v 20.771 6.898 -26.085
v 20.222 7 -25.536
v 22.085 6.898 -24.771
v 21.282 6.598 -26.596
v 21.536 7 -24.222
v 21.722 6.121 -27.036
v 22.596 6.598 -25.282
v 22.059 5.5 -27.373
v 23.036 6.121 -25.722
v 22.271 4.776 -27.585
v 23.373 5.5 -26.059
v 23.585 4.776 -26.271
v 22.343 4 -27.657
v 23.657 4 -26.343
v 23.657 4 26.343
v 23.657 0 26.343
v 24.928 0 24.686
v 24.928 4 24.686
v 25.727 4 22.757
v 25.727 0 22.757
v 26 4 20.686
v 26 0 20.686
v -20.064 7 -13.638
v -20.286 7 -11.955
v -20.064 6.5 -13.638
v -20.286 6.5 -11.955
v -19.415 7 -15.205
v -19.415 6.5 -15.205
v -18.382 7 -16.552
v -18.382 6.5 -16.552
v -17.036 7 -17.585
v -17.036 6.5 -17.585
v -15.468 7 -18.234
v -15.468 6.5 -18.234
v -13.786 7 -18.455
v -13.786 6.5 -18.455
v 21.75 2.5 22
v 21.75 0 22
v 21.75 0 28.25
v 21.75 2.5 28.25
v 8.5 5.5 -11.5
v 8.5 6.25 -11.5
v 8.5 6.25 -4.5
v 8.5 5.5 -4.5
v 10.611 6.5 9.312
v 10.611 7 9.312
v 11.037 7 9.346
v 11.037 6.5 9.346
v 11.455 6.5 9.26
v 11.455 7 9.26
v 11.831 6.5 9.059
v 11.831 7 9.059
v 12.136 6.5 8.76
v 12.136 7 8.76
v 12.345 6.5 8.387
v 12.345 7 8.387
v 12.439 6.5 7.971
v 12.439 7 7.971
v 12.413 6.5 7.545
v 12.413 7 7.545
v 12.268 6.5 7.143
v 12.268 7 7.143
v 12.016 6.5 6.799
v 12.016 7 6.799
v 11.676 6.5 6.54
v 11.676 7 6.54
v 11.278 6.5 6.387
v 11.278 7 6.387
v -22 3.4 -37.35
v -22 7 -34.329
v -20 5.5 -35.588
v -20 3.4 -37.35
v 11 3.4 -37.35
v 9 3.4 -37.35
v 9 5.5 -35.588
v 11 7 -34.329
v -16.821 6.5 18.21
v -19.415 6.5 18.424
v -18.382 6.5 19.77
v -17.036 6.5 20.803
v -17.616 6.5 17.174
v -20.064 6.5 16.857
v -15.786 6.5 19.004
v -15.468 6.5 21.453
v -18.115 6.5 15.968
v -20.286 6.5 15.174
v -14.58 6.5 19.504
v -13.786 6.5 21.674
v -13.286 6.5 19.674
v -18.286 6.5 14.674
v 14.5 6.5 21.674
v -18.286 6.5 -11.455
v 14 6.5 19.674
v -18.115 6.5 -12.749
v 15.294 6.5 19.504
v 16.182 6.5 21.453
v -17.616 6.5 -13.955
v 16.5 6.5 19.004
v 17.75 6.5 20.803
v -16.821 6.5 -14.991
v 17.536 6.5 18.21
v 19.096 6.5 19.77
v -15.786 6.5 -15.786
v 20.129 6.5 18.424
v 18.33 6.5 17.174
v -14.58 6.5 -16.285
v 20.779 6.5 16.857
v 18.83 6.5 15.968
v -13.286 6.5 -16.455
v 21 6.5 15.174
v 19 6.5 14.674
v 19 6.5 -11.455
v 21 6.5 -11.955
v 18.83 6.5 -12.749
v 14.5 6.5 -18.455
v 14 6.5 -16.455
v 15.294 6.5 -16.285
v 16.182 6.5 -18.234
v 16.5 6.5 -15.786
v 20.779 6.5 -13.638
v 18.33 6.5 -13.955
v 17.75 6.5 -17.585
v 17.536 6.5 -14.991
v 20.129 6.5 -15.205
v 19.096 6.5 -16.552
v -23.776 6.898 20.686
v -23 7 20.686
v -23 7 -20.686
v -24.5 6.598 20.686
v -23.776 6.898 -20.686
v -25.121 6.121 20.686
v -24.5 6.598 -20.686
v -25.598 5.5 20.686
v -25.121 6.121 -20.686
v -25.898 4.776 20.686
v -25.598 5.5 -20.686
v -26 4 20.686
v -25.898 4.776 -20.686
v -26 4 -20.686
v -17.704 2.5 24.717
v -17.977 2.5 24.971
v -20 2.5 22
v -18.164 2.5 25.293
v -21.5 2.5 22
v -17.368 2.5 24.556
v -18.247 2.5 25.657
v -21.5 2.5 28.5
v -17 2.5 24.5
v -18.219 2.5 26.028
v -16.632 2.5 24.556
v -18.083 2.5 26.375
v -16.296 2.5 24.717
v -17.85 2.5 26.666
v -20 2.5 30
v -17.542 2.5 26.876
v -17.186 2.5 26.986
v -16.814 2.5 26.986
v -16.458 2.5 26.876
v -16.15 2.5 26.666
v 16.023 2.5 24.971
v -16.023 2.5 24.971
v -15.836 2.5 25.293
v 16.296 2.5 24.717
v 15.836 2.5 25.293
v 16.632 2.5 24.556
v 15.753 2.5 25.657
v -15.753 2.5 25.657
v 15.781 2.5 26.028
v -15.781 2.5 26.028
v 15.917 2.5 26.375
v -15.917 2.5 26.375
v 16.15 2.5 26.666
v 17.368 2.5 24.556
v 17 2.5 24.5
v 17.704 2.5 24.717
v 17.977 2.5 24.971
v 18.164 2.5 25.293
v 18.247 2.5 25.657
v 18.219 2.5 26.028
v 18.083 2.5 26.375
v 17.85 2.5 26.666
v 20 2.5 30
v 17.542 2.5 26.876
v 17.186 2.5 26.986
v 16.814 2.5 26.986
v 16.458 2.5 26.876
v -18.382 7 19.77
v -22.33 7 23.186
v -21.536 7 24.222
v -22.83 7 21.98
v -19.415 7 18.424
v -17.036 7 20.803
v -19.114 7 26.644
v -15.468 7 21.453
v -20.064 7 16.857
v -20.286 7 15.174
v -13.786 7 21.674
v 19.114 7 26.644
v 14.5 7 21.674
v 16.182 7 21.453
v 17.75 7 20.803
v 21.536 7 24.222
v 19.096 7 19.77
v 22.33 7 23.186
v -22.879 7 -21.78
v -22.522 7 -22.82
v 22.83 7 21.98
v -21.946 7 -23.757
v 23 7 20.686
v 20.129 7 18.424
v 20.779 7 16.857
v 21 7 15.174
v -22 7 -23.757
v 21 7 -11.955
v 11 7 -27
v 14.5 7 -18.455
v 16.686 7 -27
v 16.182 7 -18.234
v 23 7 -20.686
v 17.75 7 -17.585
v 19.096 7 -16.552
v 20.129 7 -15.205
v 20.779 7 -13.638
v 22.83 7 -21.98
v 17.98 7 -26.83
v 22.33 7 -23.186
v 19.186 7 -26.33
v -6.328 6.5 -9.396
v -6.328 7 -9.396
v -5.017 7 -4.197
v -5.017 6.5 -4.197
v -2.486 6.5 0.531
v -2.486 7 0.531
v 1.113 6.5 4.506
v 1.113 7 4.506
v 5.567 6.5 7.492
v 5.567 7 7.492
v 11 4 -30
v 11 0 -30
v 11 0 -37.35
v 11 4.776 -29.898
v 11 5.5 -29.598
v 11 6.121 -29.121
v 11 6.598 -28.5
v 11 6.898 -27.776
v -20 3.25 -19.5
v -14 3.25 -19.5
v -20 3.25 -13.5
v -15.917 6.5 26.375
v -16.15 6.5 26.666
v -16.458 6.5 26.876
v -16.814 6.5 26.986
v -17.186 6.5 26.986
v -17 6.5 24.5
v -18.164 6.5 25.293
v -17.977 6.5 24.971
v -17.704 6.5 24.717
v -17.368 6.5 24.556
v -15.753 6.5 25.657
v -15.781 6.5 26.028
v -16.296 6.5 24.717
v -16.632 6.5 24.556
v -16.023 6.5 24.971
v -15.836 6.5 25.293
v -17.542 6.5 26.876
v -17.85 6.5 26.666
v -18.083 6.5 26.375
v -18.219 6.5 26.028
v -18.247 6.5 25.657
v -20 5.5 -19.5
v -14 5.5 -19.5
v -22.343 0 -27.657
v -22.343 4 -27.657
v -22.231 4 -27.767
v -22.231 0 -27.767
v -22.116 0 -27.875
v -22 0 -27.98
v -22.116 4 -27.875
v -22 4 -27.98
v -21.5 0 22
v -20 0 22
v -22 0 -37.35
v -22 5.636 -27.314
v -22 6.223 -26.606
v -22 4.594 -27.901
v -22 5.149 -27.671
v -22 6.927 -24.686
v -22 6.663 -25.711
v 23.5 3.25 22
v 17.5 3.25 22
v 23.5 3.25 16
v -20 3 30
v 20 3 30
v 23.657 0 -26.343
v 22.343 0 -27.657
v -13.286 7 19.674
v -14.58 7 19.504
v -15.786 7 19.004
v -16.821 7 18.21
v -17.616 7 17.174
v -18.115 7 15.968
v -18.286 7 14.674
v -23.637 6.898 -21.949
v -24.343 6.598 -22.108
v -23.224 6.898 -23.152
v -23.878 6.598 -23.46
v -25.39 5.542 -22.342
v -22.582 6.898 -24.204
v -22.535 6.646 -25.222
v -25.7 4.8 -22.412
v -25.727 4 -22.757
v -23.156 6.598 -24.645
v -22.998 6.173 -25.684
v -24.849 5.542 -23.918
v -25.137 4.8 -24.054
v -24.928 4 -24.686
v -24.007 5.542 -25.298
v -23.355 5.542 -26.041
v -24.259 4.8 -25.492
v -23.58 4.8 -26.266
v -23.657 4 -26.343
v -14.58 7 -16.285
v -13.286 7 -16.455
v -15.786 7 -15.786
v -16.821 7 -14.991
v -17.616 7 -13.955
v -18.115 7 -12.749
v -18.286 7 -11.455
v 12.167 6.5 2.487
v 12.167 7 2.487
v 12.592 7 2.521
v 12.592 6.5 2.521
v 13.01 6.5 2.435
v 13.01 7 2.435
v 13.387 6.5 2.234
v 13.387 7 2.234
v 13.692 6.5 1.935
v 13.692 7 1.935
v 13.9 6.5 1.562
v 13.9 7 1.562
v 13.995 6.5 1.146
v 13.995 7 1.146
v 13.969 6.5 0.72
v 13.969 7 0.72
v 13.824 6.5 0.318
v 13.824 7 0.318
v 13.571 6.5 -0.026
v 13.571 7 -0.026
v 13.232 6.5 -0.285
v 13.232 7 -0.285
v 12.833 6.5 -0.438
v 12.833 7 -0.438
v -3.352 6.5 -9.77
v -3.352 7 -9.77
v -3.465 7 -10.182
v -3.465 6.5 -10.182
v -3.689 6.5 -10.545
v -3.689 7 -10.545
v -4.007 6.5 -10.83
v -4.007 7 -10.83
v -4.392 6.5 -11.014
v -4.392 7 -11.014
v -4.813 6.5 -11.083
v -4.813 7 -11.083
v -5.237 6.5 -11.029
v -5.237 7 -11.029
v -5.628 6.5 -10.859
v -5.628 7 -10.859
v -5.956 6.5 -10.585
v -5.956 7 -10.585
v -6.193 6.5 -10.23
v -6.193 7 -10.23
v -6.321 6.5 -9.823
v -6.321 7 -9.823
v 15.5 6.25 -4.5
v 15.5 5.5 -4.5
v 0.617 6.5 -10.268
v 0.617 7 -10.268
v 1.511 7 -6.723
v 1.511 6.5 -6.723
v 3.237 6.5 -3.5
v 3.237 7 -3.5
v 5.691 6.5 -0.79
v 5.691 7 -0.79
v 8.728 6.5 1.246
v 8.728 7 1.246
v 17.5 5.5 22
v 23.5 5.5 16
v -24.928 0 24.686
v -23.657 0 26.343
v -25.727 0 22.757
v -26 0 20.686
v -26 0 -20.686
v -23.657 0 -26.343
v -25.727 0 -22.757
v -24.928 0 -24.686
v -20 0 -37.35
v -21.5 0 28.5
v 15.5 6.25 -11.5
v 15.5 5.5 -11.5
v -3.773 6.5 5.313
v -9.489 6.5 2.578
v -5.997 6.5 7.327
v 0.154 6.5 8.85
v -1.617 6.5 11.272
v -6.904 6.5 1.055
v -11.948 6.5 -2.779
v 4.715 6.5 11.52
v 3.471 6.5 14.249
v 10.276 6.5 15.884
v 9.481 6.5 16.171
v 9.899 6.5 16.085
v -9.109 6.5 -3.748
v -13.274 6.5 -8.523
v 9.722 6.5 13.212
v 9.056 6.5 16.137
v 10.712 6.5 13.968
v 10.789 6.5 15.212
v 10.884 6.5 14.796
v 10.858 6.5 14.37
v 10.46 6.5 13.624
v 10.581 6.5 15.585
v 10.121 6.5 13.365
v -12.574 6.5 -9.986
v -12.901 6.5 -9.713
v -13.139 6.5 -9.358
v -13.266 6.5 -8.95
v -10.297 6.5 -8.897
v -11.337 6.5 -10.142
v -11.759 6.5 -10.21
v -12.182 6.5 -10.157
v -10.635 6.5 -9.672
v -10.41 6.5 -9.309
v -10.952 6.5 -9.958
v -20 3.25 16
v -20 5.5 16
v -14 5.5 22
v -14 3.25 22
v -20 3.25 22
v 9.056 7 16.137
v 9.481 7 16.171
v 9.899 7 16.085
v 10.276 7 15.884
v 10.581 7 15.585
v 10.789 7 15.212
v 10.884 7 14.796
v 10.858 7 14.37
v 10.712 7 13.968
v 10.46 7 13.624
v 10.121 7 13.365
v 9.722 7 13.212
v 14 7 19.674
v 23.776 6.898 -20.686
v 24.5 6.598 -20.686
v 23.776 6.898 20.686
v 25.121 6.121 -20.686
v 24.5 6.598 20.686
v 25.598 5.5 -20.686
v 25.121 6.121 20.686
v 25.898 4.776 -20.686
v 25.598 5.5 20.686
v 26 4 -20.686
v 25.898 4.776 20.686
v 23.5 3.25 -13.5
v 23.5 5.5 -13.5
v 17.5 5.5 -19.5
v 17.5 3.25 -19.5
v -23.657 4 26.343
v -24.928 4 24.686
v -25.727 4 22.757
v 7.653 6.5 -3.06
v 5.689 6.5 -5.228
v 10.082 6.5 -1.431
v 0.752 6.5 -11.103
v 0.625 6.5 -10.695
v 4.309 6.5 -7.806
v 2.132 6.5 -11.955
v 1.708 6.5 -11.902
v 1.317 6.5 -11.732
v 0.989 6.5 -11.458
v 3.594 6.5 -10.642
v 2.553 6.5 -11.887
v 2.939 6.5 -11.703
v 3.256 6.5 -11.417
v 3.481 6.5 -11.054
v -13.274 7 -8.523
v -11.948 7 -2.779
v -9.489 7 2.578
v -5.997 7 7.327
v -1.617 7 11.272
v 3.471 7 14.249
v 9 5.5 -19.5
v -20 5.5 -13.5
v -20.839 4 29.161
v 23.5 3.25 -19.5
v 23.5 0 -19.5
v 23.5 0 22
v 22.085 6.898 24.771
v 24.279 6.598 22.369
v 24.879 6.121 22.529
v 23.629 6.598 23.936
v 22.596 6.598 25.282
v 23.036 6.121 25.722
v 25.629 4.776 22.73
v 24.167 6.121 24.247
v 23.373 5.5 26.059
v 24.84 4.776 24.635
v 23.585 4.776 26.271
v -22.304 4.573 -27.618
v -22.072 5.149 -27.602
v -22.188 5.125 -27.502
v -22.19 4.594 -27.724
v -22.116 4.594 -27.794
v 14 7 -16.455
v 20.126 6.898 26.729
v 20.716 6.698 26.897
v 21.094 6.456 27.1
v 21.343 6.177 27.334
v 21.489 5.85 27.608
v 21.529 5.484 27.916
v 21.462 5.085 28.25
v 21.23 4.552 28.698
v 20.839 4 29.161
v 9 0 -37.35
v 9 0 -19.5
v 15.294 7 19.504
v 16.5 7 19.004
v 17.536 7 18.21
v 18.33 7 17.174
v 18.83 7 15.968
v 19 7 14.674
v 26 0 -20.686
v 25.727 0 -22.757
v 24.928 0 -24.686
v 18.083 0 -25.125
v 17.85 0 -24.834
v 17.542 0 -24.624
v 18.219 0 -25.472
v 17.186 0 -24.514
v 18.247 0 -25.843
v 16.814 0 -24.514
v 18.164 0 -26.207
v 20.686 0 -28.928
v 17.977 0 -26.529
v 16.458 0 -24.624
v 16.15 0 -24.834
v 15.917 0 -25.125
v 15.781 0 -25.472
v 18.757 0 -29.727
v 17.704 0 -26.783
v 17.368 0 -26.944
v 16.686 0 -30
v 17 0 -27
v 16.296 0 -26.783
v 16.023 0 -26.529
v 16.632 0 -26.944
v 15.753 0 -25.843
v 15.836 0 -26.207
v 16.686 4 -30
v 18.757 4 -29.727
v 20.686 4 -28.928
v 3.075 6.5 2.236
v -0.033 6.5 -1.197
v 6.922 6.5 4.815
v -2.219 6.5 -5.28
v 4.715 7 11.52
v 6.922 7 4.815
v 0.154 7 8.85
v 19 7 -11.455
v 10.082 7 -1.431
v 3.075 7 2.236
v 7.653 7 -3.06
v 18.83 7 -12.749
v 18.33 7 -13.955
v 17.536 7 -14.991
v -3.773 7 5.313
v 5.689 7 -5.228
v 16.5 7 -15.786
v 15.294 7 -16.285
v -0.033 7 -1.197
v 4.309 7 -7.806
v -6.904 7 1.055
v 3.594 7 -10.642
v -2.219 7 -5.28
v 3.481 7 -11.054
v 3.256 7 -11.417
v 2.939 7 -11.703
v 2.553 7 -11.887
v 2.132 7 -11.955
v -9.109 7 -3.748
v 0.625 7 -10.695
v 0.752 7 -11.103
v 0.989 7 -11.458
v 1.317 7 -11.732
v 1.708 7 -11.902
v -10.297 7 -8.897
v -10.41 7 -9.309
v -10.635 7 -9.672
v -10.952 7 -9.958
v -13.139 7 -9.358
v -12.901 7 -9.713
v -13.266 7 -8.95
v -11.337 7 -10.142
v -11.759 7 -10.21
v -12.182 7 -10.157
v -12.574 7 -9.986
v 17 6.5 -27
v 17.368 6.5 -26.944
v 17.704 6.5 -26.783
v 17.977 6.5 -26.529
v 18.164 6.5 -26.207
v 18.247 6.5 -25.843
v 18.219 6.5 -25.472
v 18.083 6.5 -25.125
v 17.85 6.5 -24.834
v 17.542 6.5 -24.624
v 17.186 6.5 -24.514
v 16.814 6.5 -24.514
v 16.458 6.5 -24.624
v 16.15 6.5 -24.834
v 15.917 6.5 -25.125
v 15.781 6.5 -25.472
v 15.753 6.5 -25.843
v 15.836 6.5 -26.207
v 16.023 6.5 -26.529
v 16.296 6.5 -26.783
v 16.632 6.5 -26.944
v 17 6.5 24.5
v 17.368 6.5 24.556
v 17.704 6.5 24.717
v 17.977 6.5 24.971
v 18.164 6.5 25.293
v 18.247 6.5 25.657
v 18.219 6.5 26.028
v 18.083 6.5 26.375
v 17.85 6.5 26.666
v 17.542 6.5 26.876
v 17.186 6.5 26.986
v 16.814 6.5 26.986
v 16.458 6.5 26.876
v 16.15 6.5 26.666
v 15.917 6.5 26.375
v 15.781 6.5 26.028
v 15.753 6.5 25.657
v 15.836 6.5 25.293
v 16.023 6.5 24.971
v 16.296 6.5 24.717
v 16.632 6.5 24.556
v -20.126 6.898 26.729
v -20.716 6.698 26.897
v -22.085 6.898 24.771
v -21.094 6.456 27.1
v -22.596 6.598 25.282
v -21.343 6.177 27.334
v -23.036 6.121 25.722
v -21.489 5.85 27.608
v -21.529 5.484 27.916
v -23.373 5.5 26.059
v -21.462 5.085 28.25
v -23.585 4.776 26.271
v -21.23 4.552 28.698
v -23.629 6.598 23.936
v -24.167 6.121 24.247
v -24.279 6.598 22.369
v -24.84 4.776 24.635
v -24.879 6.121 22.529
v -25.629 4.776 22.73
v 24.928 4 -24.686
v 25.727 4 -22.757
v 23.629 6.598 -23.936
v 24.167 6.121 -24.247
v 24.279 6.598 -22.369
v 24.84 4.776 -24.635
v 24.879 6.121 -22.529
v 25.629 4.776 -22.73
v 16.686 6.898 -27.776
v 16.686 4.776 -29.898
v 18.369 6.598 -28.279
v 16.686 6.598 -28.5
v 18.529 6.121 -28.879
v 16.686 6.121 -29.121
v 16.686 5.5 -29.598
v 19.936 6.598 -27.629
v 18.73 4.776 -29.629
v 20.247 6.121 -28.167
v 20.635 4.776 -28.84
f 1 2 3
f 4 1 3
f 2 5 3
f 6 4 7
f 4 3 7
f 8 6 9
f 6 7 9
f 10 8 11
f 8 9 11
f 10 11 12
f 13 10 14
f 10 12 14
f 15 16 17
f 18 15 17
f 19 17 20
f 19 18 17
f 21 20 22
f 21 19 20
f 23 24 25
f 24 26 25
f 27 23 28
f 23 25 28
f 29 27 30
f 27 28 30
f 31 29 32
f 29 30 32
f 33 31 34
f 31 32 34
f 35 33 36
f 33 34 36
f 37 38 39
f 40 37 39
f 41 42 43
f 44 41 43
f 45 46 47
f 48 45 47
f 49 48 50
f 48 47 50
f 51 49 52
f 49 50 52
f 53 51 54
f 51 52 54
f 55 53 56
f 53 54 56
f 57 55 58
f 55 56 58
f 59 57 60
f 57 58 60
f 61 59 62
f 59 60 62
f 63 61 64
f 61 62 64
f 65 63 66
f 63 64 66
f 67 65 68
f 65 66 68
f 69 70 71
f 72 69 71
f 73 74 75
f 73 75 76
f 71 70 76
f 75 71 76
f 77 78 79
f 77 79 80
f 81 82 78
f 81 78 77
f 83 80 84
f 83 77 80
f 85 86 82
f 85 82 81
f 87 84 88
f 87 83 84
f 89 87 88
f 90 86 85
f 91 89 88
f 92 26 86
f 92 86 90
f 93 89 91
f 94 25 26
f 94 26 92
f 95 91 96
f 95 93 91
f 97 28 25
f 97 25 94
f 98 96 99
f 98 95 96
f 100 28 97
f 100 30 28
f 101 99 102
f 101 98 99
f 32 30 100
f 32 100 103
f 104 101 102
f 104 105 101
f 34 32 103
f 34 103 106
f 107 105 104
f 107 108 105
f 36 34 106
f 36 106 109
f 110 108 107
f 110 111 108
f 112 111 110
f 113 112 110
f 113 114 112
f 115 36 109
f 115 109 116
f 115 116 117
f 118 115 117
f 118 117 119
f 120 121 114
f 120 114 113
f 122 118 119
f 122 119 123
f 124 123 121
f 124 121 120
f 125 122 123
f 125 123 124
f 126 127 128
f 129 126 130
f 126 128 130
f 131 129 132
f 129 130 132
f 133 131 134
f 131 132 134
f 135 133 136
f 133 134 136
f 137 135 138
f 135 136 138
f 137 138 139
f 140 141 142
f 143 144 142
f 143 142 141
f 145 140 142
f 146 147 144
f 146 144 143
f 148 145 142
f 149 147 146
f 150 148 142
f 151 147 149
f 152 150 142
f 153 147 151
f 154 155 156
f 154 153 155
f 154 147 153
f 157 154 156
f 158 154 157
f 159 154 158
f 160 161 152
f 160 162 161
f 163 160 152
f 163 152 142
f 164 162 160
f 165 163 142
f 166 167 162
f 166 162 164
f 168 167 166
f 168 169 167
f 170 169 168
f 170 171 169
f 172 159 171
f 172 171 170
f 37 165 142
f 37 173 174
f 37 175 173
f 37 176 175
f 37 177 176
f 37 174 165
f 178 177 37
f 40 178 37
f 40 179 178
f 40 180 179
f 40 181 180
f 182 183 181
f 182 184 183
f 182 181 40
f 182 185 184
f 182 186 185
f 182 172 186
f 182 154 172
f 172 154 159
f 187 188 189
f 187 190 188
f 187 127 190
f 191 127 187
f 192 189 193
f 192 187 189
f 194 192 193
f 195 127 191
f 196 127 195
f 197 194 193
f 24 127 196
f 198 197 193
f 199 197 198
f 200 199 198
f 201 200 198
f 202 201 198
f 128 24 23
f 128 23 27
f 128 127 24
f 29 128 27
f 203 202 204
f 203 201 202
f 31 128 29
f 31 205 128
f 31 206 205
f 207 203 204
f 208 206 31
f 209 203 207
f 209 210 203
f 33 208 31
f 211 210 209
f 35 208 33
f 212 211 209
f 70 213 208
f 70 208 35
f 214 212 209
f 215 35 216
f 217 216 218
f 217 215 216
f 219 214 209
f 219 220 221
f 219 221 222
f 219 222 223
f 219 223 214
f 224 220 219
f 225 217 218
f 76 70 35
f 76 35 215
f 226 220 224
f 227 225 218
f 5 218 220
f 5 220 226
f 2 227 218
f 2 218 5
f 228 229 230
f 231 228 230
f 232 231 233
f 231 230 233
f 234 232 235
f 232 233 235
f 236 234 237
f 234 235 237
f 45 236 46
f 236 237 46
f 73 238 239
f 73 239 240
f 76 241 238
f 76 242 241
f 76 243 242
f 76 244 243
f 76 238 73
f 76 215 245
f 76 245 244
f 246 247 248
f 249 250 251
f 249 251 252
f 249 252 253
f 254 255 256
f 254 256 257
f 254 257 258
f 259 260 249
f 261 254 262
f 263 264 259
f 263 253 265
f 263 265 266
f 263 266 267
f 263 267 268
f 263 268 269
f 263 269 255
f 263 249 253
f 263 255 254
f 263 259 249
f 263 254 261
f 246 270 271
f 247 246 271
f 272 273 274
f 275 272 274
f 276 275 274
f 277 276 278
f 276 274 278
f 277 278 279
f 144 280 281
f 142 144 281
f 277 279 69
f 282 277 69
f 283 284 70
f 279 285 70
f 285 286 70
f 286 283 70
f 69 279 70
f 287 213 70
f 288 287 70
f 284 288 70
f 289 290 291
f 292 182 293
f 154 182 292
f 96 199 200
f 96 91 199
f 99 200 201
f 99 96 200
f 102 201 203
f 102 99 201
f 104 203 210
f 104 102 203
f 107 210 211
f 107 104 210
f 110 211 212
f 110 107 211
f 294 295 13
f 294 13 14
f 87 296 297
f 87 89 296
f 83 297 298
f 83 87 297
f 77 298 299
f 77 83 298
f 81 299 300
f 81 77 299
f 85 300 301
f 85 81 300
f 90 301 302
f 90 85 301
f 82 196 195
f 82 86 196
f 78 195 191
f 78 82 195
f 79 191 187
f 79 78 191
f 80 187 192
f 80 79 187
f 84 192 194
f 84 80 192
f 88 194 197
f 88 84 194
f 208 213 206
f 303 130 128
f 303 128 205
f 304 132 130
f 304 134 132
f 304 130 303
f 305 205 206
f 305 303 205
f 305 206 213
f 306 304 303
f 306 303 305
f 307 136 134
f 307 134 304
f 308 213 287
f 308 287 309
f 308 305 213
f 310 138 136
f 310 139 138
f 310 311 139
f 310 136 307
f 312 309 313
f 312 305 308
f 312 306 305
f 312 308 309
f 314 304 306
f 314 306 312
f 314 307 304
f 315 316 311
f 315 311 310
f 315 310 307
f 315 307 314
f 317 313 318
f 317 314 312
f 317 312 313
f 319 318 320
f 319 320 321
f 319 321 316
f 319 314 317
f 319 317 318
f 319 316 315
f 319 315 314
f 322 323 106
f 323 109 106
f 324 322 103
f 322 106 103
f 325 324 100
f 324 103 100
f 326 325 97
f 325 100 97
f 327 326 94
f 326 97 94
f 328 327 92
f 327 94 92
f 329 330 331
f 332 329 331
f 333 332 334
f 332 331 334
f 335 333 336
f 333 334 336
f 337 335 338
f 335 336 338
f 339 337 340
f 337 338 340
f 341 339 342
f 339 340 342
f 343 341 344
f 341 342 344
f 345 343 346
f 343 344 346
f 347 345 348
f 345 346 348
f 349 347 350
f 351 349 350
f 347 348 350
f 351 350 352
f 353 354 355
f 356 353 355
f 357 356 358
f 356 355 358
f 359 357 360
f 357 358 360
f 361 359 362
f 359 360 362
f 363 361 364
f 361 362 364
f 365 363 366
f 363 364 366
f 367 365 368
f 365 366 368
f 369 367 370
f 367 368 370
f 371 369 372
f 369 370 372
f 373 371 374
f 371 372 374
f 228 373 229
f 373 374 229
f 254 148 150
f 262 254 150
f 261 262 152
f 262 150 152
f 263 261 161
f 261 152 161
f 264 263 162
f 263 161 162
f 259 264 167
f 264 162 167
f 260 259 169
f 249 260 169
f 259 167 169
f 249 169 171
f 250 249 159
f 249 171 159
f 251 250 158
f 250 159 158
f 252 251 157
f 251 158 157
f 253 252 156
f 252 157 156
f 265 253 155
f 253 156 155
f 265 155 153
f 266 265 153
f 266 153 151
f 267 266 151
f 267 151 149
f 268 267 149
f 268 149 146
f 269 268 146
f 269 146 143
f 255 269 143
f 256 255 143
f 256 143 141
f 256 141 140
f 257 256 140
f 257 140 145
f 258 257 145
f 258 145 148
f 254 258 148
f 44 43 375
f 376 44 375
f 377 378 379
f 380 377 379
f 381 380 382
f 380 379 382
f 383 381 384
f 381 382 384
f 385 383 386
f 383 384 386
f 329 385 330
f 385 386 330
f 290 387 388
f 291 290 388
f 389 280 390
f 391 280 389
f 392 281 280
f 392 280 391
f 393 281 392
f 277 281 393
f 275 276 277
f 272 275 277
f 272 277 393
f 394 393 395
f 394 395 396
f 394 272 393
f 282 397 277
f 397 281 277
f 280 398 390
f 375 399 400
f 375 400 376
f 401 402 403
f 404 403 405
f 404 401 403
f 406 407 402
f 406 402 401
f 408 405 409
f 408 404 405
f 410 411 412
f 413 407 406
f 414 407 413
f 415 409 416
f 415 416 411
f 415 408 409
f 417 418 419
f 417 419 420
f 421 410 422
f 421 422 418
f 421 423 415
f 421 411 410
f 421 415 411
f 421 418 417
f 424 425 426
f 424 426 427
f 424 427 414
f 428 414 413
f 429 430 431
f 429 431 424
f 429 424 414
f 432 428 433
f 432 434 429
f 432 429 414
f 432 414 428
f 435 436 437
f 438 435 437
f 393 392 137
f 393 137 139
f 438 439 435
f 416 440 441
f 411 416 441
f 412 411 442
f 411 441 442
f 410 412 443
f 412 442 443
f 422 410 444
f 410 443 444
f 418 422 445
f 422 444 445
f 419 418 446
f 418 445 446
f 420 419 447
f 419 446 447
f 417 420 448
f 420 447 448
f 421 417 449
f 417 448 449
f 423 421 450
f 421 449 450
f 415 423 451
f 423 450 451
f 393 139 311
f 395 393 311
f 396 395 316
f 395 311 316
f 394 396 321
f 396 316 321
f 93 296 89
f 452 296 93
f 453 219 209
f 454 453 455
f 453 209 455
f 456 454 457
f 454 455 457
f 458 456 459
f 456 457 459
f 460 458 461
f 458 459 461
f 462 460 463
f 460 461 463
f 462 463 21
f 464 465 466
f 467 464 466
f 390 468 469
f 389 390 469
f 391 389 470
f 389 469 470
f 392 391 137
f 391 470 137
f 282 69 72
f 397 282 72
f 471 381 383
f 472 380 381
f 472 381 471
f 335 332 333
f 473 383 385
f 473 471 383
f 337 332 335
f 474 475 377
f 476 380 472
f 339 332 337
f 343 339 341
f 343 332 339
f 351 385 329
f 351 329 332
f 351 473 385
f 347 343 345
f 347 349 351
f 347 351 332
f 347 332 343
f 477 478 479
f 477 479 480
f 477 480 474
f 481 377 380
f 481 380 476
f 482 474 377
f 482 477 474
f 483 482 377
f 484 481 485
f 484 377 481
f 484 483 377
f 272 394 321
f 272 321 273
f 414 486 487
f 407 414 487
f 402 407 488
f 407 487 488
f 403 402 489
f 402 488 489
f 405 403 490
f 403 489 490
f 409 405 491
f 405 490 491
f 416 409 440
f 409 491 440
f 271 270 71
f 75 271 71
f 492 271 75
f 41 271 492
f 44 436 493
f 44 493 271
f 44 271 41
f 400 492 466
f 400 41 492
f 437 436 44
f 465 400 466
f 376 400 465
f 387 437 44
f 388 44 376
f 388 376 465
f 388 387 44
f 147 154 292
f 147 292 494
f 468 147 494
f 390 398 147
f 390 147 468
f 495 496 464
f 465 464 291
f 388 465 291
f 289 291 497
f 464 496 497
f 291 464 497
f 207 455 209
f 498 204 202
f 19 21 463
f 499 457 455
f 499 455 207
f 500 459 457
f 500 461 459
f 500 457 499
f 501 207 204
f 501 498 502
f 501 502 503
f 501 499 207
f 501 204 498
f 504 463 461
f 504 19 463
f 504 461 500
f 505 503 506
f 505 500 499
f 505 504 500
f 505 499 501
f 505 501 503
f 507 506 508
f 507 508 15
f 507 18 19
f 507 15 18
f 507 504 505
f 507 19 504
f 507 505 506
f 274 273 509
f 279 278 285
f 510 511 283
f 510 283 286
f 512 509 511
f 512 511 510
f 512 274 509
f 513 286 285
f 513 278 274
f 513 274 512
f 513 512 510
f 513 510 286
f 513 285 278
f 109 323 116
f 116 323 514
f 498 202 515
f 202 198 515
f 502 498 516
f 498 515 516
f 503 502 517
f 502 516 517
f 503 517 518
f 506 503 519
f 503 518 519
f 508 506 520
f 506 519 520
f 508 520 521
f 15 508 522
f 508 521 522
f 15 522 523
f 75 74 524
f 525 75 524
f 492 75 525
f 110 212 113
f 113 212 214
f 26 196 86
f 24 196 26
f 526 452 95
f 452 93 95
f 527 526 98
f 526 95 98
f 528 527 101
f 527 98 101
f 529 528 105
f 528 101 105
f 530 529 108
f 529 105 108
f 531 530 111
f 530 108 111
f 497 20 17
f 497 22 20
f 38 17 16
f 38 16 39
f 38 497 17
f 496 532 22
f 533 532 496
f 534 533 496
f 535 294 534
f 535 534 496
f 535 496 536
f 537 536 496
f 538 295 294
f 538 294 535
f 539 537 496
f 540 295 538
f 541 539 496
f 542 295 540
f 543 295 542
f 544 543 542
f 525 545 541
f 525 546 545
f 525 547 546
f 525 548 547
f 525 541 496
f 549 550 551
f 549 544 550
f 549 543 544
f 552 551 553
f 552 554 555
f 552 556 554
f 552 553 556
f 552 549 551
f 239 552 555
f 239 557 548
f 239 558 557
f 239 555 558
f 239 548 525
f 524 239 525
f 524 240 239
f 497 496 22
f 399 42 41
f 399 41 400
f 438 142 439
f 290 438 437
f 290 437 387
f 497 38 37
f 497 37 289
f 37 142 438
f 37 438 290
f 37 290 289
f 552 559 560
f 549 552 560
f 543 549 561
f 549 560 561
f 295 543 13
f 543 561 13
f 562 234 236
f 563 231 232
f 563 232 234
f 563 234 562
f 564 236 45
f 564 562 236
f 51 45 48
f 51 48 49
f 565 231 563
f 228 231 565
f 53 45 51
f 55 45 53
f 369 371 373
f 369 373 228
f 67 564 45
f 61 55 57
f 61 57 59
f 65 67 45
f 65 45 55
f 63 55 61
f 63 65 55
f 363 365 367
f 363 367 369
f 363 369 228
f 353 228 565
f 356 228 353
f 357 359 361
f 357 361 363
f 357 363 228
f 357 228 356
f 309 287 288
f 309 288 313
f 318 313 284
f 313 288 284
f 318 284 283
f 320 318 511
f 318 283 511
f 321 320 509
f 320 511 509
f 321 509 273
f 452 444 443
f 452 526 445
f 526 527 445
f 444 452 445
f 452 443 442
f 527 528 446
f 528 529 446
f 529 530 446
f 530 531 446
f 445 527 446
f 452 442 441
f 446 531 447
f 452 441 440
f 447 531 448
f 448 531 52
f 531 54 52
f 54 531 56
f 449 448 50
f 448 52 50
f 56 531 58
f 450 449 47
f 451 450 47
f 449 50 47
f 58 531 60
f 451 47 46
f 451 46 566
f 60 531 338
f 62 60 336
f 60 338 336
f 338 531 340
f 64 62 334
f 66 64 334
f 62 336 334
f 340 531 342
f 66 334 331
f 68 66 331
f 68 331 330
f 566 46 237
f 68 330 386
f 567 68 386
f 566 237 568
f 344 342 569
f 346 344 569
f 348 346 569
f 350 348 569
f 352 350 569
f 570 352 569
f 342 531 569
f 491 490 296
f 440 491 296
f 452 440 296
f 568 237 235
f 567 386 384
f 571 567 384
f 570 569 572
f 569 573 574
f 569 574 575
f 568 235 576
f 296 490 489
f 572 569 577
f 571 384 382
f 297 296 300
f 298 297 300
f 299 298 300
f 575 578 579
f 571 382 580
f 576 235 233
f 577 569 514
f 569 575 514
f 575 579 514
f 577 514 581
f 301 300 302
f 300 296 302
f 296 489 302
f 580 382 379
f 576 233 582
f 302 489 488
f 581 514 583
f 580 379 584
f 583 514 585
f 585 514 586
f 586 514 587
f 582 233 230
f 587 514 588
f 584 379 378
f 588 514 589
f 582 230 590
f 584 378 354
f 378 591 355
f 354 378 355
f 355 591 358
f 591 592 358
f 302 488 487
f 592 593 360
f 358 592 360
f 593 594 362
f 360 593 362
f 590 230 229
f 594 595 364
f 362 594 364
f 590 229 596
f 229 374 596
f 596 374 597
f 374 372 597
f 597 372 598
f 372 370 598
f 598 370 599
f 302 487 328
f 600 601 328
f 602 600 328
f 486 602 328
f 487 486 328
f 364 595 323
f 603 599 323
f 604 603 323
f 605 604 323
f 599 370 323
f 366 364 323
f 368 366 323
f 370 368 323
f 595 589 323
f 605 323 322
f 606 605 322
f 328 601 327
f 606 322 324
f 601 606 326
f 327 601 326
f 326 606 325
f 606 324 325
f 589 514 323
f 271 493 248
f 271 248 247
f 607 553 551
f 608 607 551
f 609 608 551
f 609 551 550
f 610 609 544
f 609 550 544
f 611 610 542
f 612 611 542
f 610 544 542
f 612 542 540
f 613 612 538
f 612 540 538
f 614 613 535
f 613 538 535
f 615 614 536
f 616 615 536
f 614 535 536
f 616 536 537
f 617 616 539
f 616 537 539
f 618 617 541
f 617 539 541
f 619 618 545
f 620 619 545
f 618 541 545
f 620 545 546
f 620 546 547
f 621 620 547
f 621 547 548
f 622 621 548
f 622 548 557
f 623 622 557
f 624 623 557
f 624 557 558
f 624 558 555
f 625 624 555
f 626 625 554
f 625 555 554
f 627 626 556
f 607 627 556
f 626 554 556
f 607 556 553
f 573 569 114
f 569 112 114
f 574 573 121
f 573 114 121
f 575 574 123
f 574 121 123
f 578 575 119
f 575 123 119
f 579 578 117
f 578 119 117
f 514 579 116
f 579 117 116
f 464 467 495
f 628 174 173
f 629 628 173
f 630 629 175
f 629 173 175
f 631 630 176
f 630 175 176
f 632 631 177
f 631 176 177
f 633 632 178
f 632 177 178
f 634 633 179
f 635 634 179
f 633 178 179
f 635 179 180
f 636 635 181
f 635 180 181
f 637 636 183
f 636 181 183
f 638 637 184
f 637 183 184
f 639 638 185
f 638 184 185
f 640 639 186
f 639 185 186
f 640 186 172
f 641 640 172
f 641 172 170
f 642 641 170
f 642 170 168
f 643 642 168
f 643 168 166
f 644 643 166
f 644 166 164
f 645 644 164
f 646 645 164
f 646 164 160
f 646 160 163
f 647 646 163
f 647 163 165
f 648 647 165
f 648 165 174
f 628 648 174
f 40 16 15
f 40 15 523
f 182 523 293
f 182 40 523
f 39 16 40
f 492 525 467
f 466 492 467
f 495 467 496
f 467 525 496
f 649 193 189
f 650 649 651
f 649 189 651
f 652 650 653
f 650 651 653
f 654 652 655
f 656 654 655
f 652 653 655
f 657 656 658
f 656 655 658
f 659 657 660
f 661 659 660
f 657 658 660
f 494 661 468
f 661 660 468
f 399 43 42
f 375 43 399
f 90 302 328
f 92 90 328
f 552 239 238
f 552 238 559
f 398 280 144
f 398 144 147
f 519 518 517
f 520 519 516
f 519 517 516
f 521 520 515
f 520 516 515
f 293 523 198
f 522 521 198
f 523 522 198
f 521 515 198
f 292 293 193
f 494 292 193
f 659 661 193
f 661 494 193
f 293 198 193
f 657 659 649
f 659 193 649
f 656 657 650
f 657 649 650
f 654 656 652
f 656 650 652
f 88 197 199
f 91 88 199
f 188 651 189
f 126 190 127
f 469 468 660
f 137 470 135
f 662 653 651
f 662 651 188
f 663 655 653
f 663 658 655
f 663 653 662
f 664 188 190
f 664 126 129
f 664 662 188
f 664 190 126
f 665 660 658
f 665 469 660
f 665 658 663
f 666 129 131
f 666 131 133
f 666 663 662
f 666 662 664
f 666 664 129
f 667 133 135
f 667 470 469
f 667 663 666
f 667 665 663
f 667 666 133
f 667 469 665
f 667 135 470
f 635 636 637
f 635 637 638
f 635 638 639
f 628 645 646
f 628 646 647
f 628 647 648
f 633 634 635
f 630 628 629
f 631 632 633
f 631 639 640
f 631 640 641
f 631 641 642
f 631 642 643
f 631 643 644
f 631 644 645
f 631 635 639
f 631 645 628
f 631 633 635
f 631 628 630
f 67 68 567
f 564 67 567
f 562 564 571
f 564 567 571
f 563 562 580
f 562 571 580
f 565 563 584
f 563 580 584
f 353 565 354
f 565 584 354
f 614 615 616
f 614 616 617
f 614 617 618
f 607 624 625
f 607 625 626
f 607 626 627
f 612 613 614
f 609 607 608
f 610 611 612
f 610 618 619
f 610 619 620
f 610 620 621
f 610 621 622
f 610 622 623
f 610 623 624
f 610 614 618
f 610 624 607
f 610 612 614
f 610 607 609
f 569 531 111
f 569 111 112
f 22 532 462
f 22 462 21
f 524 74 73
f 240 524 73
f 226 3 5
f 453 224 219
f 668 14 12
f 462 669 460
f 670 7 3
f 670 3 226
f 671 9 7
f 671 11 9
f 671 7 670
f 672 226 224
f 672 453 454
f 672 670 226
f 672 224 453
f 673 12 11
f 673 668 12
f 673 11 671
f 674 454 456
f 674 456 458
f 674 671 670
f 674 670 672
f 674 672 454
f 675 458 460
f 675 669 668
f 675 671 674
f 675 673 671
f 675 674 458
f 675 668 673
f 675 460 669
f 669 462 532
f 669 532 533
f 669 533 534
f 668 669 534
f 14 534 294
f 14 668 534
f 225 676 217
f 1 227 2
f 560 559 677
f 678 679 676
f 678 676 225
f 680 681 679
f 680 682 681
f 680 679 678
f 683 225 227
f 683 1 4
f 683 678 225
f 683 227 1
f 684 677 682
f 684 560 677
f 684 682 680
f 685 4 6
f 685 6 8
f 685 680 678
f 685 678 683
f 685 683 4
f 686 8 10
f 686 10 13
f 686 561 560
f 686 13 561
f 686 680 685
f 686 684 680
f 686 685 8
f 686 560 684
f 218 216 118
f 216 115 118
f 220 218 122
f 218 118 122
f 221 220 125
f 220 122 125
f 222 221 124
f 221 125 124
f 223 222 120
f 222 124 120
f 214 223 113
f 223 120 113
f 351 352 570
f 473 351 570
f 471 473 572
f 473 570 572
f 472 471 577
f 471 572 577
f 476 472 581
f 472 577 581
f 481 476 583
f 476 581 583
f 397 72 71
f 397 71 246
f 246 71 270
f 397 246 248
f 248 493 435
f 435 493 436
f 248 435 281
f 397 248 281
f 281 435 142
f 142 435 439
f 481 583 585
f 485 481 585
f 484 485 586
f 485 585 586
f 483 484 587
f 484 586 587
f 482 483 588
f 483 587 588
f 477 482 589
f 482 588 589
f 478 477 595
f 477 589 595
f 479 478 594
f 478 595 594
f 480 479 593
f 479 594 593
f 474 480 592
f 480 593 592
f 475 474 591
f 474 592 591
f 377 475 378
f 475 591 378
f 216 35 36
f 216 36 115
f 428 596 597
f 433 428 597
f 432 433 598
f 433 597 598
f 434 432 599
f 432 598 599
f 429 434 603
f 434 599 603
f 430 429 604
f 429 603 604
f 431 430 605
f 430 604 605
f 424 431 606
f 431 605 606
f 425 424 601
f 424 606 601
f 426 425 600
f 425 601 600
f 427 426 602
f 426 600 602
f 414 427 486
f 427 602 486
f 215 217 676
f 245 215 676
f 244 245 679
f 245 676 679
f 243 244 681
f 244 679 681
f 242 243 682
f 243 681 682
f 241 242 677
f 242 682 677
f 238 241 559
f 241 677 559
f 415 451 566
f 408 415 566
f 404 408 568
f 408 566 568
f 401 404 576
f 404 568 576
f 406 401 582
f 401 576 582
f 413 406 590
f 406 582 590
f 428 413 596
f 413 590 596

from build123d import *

# Parameters (mm, degrees)
BOSS_EXTRUDE1_DEPTH = 7
SKETCH2_W           = 43.5
SKETCH2_H           = 41.5
CUT_EXTRUDE1_DEPTH  = 6.25
BOSS_EXTRUDE2_DEPTH = 3
SKETCH4_W           = 43.25
SKETCH4_H           = 16.326941356
CUT_EXTRUDE2_DEPTH  = 2.5
SKETCH5_R           = 1.25
CUT_EXTRUDE3_DEPTH  = 6.5
SKETCH6_W           = 43.5
SKETCH6_H           = 41.5
SKETCH6_W_2         = 7
SKETCH6_H_2         = 7
BOSS_EXTRUDE3_DEPTH = 0.75
SKETCH7_W           = 41.285529239
SKETCH7_H           = 40.12964718
SKETCH7_W_2         = 37.285529239
SKETCH7_H_2         = 36.12964718
CUT_EXTRUDE4_DEPTH  = 0.5
CHAMFER1_SIZE       = 4
CHAMFER1_SIZE2      = 3.356398525
FILLET1_R           = 8
FILLET2_R           = 3
FILLET3_R           = 5
FILLET4_R           = 6.5
BOSS_EXTRUDE4_REACH = 42.311
SKETCH11_W          = 33
SKETCH11_H          = 13.592640687
CHAMFER2_SIZE       = 3.6
CHAMFER2_SIZE2      = 3.020758672
CUT_EXTRUDE7_START  = -5.5
SKETCH12_W          = 29
SKETCH12_H          = 17.85
CUT_EXTRUDE7_DEPTH  = 5.5


with BuildPart() as part:
    # Sketch1 → Boss-Extrude1 (new body)
    with BuildSketch(Plane(origin=(0, 0, 0), x_dir=(1, 0, 0), z_dir=(0, 1, 0))):
        Polygon((-26, 24), (-20, 30), (20, 30), (26, 24), (26, -24), (20, -30), (-20, -30), (-26, -24), align=None)
    extrude(amount=BOSS_EXTRUDE1_DEPTH)

    # Sketch2 → Cut-Extrude1 (cut)
    with BuildSketch(Plane.XZ):
        with Locations((1.75, 1.25)):
            Rectangle(SKETCH2_W, SKETCH2_H)
    extrude(amount=-CUT_EXTRUDE1_DEPTH, mode=Mode.SUBTRACT)

    # Sketch3 → Boss-Extrude2 (add)
    with BuildSketch(Plane.XZ.offset(-6.25)):
        Polygon((-20, 16), (-14, 22), (-20, 22), align=None)
        Polygon((-20, -13.5), (-14, -19.5), (-20, -19.5), align=None)
        Polygon((17.5, -19.5), (23.5, -19.5), (23.5, -13.5), align=None)
        Polygon((17.5, 22), (23.5, 16), (23.5, 22), align=None)
    extrude(amount=BOSS_EXTRUDE2_DEPTH)

    # Sketch4 → Cut-Extrude2 (cut)
    with BuildSketch(Plane.XZ):
        with Locations((0.125, 30.163470678)):
            Rectangle(SKETCH4_W, SKETCH4_H)
    extrude(amount=-CUT_EXTRUDE2_DEPTH, mode=Mode.SUBTRACT)

    # Sketch5 → Cut-Extrude3 (cut)
    with BuildSketch(Plane.XZ):
        with Locations(Location((-17, 25.75, 0), (0, 0, 270))):
            Circle(SKETCH5_R)
        with Locations(Location((17, 25.75, 0), (0, 0, 270))):
            Circle(SKETCH5_R)
        with Locations(Location((17, -25.75, 0), (0, 0, 270))):
            Circle(SKETCH5_R)
    extrude(amount=-CUT_EXTRUDE3_DEPTH, mode=Mode.SUBTRACT)

    # Sketch6 → Boss-Extrude3 (add)
    with BuildSketch(Plane.XZ.offset(-6.25)):
        with Locations((1.75, 1.25)):
            Rectangle(SKETCH6_W, SKETCH6_H)
        with Locations((12, -8)):
            Rectangle(SKETCH6_W_2, SKETCH6_H_2, mode=Mode.SUBTRACT)
    extrude(amount=BOSS_EXTRUDE3_DEPTH)

    # Sketch7 → Cut-Extrude4 (cut)
    with BuildSketch(Plane(origin=(0, 7, 0), x_dir=(1, 0, 0), z_dir=(0, 1, 0))):
        with Locations((0.35723538, -1.609430965)):
            Rectangle(SKETCH7_W, SKETCH7_H)
        with Locations((0.35723538, -1.609430965)):
            Rectangle(SKETCH7_W_2, SKETCH7_H_2, mode=Mode.SUBTRACT)
        with BuildLine():
            ThreePointArc((-13.273830834, 8.523353213), (-5.99678776, -7.326911946), (9.055555556, -16.136748619))
            ThreePointArc((9.055555556, -16.136748619), (10.851382953, -15.007587888), (9.722222222, -13.21176049))
            ThreePointArc((9.722222222, -13.21176049), (-3.77298213, -5.313286231), (-10.297227644, 8.897296325))
            ThreePointArc((-10.297227644, 8.897296325), (-11.972500795, 10.198626364), (-13.273830834, 8.523353213))
        make_face()
        with BuildLine():
            ThreePointArc((-6.328423391, 9.395887141), (-0.807907956, -2.628451945), (10.611111111, -9.311776318))
            ThreePointArc((10.611111111, -9.311776318), (12.406938509, -8.182615587), (11.277777778, -6.386788189))
            ThreePointArc((11.277777778, -6.386788189), (1.415897675, -0.61482623), (-3.351820202, 9.769830253))
            ThreePointArc((-3.351820202, 9.769830253), (-5.027093352, 11.071160292), (-6.328423391, 9.395887141))
        make_face()
        with BuildLine():
            ThreePointArc((0.616984051, 10.268421069), (4.380971848, 2.070008056), (12.166666667, -2.486804017))
            ThreePointArc((12.166666667, -2.486804017), (13.962494065, -1.357643286), (12.833333333, 0.438184112))
            ThreePointArc((12.833333333, 0.438184112), (6.604777479, 4.08363377), (3.593587241, 10.642364181))
            ThreePointArc((3.593587241, 10.642364181), (1.91831409, 11.94369422), (0.616984051, 10.268421069))
        make_face()
    extrude(amount=-CUT_EXTRUDE4_DEPTH, mode=Mode.SUBTRACT)

    # Chamfer1
    chamfer1_edges = [part.edges().sort_by_distance(p)[0] for p in [
        (0, 7, 30),
    ]]
    chamfer1_side = [part.faces().sort_by_distance(p)[0] for p in [
        (0, 4.75, 30),
    ]]
    chamfer(chamfer1_edges, length=CHAMFER1_SIZE, length2=CHAMFER1_SIZE2, reference=chamfer1_side[0])

    # Fillet1
    fillet1_edges = [part.edges().sort_by_distance(p)[0] for p in [
        (-26, 3.5, -24),
        (-20, 3.5, -30),
        (20, 3.5, -30),
        (26, 3.5, -24),
        (26, 3.5, 24),
        (-26, 3.5, 24),
    ]]
    fillet(fillet1_edges, radius=FILLET1_R)

    # Fillet2
    fillet2_edges = [part.edges().sort_by_distance(p)[0] for p in [
        (23.506626387, 7, 26.493373613),
        (0, 7, -30),
        (23, 7, -27),
        (-23.506626387, 7, 26.493373613),
        (26, 7, 0),
        (-23, 7, -27),
        (-26, 7, 0),
        (-25.39103626, 7, 23.74775896),
        (-25.39103626, 7, -23.74775896),
        (-19.74775896, 7, -29.39103626),
        (25.39103626, 7, 23.74775896),
        (25.39103626, 7, -23.74775896),
        (19.74775896, 7, -29.39103626),
    ]]
    fillet(fillet2_edges, radius=FILLET2_R)

    # Fillet3
    fillet3_edges = [part.edges().sort_by_distance(p)[0] for p in [
        (19, 6.75, -16.455392625),
        (-18.285529239, 6.75, -16.455392625),
        (-18.285529239, 6.75, 19.674254555),
        (19, 6.75, 19.674254555),
    ]]
    fillet(fillet3_edges, radius=FILLET3_R)

    # Fillet4
    fillet4_edges = [part.edges().sort_by_distance(p)[0] for p in [
        (-20.285529239, 6.75, 21.674254555),
        (-20.285529239, 6.75, -18.455392625),
        (21, 6.75, -18.455392625),
        (21, 6.75, 21.674254555),
    ]]
    fillet(fillet4_edges, radius=FILLET4_R)

    # Boss-Extrude4: up to this face of the body (flat: up to its plane)
    boss_extrude4_end = Plane(part.part.faces().sort_by_distance((-25.217296352, 0, 0))[0])
    # Sketch11 → Boss-Extrude4 (add, up to the picked face)
    with BuildSketch(Plane(origin=(0, 7, 0), x_dir=(1, 0, 0), z_dir=(0, 1, 0)), mode=Mode.PRIVATE) as boss_extrude4_sk1:
        with Locations((-5.5, 30.553679657)):
            Rectangle(SKETCH11_W, SKETCH11_H)
    boss_extrude4_tool1 = split(extrude(boss_extrude4_sk1.sketch, amount=-BOSS_EXTRUDE4_REACH, mode=Mode.PRIVATE), bisect_by=boss_extrude4_end, keep=Keep.BOTH, mode=Mode.PRIVATE)
    add(boss_extrude4_tool1.solids().sort_by(Axis((-5.5, 7, -30.55368), (0, -1, 0)))[0])

    # Chamfer2
    chamfer2_edges = [part.edges().sort_by_distance(p)[0] for p in [
        (-5.5, 7, -37.35),
    ]]
    chamfer2_side = [part.faces().sort_by_distance(p)[0] for p in [
        (-5.5, 3.5, -37.35),
    ]]
    chamfer(chamfer2_edges, length=CHAMFER2_SIZE, length2=CHAMFER2_SIZE2, reference=chamfer2_side[0])

    # Sketch12 → Cut-Extrude7 (cut)
    with BuildSketch(Plane.XZ.offset(CUT_EXTRUDE7_START)):
        with Locations((-5.5, -28.425)):
            Rectangle(SKETCH12_W, SKETCH12_H)
    extrude(amount=CUT_EXTRUDE7_DEPTH, mode=Mode.SUBTRACT)


solid = part.part
